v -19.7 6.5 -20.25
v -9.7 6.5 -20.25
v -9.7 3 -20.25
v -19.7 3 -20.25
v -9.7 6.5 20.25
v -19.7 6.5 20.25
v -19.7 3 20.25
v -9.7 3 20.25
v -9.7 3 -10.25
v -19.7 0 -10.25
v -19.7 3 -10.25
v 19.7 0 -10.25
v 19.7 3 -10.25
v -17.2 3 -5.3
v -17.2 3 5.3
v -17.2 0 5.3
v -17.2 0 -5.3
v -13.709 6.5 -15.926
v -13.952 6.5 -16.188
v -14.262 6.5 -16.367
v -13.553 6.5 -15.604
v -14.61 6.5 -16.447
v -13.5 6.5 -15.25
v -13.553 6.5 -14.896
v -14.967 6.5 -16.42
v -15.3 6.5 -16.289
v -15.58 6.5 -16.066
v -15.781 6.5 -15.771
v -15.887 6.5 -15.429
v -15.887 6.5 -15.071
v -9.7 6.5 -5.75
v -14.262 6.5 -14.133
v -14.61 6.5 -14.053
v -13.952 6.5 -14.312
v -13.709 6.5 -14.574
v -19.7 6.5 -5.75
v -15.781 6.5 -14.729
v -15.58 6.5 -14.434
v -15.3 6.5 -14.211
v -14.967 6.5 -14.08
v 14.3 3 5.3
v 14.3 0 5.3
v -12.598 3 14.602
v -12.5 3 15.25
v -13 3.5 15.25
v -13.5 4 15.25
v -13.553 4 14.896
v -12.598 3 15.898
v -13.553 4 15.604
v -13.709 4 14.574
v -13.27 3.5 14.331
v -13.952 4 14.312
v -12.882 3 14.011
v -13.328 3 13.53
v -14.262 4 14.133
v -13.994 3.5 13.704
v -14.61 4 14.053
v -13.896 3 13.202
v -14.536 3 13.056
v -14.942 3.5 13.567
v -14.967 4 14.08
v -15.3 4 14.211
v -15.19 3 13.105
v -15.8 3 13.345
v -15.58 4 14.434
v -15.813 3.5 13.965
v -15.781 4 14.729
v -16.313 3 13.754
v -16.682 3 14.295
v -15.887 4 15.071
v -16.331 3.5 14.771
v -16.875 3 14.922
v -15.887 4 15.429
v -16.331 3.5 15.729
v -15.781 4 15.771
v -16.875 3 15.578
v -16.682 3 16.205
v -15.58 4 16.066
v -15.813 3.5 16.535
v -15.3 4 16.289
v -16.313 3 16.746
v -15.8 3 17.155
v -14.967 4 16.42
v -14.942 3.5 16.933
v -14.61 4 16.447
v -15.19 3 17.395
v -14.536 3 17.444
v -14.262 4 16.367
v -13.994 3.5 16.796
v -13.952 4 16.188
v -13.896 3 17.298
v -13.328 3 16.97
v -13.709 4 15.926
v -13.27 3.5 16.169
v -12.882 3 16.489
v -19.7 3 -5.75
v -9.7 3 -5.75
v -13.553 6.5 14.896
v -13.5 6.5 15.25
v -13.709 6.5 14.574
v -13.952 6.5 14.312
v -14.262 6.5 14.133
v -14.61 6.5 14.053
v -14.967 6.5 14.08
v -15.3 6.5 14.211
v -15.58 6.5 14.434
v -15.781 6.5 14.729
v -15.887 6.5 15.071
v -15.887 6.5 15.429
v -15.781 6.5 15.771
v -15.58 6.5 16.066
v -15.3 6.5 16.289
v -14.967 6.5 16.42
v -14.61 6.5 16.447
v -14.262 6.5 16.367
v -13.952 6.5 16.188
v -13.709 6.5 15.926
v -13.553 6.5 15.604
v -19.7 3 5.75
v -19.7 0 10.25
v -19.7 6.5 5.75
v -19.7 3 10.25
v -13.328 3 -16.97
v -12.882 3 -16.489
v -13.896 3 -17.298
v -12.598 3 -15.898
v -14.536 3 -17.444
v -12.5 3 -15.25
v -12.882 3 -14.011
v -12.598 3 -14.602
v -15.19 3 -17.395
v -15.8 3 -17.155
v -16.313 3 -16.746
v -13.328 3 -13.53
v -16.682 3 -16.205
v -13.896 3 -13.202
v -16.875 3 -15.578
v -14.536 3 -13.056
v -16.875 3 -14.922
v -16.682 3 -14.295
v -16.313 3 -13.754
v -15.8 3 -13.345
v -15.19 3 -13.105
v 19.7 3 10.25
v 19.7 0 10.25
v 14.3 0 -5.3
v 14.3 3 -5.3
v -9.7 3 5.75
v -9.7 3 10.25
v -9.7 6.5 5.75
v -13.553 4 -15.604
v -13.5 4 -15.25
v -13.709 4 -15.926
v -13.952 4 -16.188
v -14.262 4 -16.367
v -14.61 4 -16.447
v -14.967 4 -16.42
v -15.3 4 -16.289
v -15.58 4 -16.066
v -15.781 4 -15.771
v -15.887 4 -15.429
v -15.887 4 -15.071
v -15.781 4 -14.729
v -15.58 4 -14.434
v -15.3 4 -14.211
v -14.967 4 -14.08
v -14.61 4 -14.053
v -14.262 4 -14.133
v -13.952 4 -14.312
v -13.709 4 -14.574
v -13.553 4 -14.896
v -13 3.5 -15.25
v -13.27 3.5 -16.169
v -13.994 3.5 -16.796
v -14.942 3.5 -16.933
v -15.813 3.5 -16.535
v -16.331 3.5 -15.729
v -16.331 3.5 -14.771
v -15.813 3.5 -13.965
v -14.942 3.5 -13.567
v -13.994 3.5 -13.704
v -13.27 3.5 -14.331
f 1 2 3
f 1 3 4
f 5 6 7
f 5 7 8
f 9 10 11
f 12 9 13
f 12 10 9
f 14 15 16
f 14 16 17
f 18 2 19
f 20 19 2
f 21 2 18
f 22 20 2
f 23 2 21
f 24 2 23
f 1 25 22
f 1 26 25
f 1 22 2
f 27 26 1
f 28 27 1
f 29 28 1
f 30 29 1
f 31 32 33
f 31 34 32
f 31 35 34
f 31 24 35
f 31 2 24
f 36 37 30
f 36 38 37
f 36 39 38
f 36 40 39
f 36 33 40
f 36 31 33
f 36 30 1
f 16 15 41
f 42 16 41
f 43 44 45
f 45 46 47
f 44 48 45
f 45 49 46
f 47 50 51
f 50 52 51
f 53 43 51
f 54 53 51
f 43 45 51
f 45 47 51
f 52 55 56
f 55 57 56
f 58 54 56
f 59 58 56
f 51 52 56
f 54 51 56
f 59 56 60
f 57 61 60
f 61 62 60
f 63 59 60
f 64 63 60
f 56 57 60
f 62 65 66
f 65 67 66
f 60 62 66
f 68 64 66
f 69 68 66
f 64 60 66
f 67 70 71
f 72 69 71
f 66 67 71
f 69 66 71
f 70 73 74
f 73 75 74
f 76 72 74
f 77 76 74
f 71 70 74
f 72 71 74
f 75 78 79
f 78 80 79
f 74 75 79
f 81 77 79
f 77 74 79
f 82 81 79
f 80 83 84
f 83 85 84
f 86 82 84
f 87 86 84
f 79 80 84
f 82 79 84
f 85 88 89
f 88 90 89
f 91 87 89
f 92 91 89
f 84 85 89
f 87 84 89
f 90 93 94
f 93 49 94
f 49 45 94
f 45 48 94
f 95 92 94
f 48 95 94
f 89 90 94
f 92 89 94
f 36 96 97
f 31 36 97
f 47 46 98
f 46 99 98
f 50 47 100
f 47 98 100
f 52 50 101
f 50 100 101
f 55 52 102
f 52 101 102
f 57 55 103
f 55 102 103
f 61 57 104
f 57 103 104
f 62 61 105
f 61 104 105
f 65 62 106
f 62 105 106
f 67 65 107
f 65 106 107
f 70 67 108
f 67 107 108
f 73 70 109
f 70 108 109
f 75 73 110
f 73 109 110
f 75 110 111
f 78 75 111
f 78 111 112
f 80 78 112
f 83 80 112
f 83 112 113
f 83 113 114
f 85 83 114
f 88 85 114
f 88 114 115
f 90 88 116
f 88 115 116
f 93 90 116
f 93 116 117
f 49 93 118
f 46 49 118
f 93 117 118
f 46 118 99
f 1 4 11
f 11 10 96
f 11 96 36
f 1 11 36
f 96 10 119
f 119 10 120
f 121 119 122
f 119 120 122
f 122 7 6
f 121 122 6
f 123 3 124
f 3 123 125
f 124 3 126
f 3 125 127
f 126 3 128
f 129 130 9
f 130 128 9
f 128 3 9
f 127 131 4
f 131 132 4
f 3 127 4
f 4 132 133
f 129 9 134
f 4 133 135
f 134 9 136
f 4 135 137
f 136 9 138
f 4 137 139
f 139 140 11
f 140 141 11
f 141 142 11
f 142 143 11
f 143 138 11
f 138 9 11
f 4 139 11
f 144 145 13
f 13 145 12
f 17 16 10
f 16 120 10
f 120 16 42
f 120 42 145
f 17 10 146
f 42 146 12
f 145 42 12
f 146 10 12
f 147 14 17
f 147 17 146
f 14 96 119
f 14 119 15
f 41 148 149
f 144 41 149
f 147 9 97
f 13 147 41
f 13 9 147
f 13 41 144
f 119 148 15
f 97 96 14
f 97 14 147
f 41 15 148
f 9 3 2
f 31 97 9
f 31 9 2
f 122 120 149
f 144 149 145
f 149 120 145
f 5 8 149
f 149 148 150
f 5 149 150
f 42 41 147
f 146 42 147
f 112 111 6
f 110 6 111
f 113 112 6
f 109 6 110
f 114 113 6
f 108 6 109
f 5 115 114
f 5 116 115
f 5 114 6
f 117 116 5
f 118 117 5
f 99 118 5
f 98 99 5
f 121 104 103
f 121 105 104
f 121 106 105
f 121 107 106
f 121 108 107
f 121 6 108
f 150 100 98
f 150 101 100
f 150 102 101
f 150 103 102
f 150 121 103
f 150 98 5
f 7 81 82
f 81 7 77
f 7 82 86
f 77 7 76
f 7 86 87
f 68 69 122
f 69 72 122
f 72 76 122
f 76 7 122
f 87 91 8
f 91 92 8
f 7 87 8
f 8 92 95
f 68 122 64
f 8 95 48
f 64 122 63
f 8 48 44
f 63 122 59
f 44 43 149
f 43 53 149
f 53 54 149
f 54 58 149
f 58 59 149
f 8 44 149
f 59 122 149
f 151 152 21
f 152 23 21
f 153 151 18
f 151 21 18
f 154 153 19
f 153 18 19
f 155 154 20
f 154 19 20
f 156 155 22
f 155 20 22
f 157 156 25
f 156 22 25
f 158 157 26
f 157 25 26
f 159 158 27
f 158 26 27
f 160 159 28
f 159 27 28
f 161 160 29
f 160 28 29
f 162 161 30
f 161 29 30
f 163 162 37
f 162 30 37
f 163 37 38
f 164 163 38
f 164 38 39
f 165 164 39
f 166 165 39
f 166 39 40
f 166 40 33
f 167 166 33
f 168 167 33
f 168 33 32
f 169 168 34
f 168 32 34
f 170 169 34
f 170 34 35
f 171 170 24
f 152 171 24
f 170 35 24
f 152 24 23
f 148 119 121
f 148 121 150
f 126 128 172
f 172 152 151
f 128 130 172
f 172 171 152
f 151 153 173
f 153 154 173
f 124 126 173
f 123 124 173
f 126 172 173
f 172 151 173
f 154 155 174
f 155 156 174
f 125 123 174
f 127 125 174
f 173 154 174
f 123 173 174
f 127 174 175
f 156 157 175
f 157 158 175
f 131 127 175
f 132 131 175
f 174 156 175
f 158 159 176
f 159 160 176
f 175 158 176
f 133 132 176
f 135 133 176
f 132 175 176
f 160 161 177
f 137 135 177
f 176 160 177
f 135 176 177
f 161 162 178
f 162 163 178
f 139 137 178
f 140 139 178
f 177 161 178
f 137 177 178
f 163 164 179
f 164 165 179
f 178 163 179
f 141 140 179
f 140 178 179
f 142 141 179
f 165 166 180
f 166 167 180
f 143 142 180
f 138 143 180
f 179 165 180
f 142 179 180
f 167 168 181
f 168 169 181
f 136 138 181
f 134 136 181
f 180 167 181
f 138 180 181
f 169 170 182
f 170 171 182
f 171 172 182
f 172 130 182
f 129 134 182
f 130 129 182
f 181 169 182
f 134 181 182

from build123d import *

# Parameters (mm, degrees)
SKETCH1_W                                       = 39.4
SKETCH1_H                                       = 20.5
BOSS_EXTRUDE1_DEPTH                             = 3
SKETCH3_W                                       = 28.6
SKETCH3_H                                       = 10.6
CUT_EXTRUDE1_DEPTH                              = 3
SKETCH4_W                                       = 10
SKETCH4_H                                       = 4.5
BOSS_EXTRUDE2_DEPTH                             = 3.5
SKETCH5_W                                       = 10
SKETCH5_H                                       = 3.5
BOSS_EXTRUDE3_DEPTH                             = 10
SKETCH6_W                                       = 10
SKETCH6_H                                       = 3.5
BOSS_EXTRUDE4_DEPTH                             = 10
CSK_FOR_M2_FLAT_HEAD_MACHINE_SCREW1_D           = 2.4
CSK_FOR_M2_FLAT_HEAD_MACHINE_SCREW1_CSINK_D     = 4.4
CSK_FOR_M2_FLAT_HEAD_MACHINE_SCREW1_CSINK_ANGLE = 90
CSK_FOR_M2_FLAT_HEAD_MACHINE_SCREW2_D           = 2.4
CSK_FOR_M2_FLAT_HEAD_MACHINE_SCREW2_CSINK_D     = 4.4
CSK_FOR_M2_FLAT_HEAD_MACHINE_SCREW2_CSINK_ANGLE = 90
SKETCH16_W                                      = 2.9
SKETCH16_H                                      = 10.6
CUT_EXTRUDE2_DEPTH                              = 3


with BuildPart() as part:
    # Sketch1 → Boss-Extrude1 (new body)
    with BuildSketch(Plane(origin=(0, 0, 0), x_dir=(1, 0, 0), z_dir=(0, 1, 0))):
        Rectangle(SKETCH1_W, SKETCH1_H)
    extrude(amount=BOSS_EXTRUDE1_DEPTH)

    # Sketch3 → Cut-Extrude1 (cut)
    with BuildSketch(Plane(origin=(0, 3, 0), x_dir=(1, 0, 0), z_dir=(0, 1, 0))):
        Rectangle(SKETCH3_W, SKETCH3_H)
    extrude(amount=-CUT_EXTRUDE1_DEPTH, mode=Mode.SUBTRACT)

    # Sketch4 → Boss-Extrude2 (add)
    with BuildSketch(Plane(origin=(0, 3, 0), x_dir=(1, 0, 0), z_dir=(0, 1, 0))):
        with Locations((-14.7, 8)):
            Rectangle(SKETCH4_W, SKETCH4_H)
        with Locations((-14.7, -8)):
            Rectangle(SKETCH4_W, SKETCH4_H)
    extrude(amount=BOSS_EXTRUDE2_DEPTH)

    # Sketch5 → Boss-Extrude3 (add)
    with BuildSketch(Plane.XY.offset(10.25)):
        with Locations((-14.7, 4.75)):
            Rectangle(SKETCH5_W, SKETCH5_H)
    extrude(amount=BOSS_EXTRUDE3_DEPTH)

    # Sketch6 → Boss-Extrude4 (add)
    with BuildSketch(Plane(origin=(0, 0, -10.25), x_dir=(-1, 0, 0), z_dir=(0, 0, -1))):
        with Locations((14.7, 4.75)):
            Rectangle(SKETCH6_W, SKETCH6_H)
    extrude(amount=BOSS_EXTRUDE4_DEPTH)

    # CSK for M2 Flat Head Machine Screw1 (through all)
    with Locations(Plane(origin=(0, 3, 0), x_dir=(-1, 0, 0), z_dir=(0, -1, 0))):
        with Locations((14.7, 15.25)):
            CounterSinkHole(CSK_FOR_M2_FLAT_HEAD_MACHINE_SCREW1_D / 2, CSK_FOR_M2_FLAT_HEAD_MACHINE_SCREW1_CSINK_D / 2, counter_sink_angle=CSK_FOR_M2_FLAT_HEAD_MACHINE_SCREW1_CSINK_ANGLE)

    # CSK for M2 Flat Head Machine Screw2 (through all)
    with Locations(Plane(origin=(0, 3, 0), x_dir=(-1, 0, 0), z_dir=(0, -1, 0))):
        with Locations((14.7, -15.25)):
            CounterSinkHole(CSK_FOR_M2_FLAT_HEAD_MACHINE_SCREW2_D / 2, CSK_FOR_M2_FLAT_HEAD_MACHINE_SCREW2_CSINK_D / 2, counter_sink_angle=CSK_FOR_M2_FLAT_HEAD_MACHINE_SCREW2_CSINK_ANGLE)

    # Sketch16 → Cut-Extrude2 (cut)
    with BuildSketch(Plane(origin=(0, 3, 0), x_dir=(1, 0, 0), z_dir=(0, 1, 0))):
        with Locations((-15.75, 0)):
            Rectangle(SKETCH16_W, SKETCH16_H)
    extrude(amount=-CUT_EXTRUDE2_DEPTH, mode=Mode.SUBTRACT)


solid = part.part
